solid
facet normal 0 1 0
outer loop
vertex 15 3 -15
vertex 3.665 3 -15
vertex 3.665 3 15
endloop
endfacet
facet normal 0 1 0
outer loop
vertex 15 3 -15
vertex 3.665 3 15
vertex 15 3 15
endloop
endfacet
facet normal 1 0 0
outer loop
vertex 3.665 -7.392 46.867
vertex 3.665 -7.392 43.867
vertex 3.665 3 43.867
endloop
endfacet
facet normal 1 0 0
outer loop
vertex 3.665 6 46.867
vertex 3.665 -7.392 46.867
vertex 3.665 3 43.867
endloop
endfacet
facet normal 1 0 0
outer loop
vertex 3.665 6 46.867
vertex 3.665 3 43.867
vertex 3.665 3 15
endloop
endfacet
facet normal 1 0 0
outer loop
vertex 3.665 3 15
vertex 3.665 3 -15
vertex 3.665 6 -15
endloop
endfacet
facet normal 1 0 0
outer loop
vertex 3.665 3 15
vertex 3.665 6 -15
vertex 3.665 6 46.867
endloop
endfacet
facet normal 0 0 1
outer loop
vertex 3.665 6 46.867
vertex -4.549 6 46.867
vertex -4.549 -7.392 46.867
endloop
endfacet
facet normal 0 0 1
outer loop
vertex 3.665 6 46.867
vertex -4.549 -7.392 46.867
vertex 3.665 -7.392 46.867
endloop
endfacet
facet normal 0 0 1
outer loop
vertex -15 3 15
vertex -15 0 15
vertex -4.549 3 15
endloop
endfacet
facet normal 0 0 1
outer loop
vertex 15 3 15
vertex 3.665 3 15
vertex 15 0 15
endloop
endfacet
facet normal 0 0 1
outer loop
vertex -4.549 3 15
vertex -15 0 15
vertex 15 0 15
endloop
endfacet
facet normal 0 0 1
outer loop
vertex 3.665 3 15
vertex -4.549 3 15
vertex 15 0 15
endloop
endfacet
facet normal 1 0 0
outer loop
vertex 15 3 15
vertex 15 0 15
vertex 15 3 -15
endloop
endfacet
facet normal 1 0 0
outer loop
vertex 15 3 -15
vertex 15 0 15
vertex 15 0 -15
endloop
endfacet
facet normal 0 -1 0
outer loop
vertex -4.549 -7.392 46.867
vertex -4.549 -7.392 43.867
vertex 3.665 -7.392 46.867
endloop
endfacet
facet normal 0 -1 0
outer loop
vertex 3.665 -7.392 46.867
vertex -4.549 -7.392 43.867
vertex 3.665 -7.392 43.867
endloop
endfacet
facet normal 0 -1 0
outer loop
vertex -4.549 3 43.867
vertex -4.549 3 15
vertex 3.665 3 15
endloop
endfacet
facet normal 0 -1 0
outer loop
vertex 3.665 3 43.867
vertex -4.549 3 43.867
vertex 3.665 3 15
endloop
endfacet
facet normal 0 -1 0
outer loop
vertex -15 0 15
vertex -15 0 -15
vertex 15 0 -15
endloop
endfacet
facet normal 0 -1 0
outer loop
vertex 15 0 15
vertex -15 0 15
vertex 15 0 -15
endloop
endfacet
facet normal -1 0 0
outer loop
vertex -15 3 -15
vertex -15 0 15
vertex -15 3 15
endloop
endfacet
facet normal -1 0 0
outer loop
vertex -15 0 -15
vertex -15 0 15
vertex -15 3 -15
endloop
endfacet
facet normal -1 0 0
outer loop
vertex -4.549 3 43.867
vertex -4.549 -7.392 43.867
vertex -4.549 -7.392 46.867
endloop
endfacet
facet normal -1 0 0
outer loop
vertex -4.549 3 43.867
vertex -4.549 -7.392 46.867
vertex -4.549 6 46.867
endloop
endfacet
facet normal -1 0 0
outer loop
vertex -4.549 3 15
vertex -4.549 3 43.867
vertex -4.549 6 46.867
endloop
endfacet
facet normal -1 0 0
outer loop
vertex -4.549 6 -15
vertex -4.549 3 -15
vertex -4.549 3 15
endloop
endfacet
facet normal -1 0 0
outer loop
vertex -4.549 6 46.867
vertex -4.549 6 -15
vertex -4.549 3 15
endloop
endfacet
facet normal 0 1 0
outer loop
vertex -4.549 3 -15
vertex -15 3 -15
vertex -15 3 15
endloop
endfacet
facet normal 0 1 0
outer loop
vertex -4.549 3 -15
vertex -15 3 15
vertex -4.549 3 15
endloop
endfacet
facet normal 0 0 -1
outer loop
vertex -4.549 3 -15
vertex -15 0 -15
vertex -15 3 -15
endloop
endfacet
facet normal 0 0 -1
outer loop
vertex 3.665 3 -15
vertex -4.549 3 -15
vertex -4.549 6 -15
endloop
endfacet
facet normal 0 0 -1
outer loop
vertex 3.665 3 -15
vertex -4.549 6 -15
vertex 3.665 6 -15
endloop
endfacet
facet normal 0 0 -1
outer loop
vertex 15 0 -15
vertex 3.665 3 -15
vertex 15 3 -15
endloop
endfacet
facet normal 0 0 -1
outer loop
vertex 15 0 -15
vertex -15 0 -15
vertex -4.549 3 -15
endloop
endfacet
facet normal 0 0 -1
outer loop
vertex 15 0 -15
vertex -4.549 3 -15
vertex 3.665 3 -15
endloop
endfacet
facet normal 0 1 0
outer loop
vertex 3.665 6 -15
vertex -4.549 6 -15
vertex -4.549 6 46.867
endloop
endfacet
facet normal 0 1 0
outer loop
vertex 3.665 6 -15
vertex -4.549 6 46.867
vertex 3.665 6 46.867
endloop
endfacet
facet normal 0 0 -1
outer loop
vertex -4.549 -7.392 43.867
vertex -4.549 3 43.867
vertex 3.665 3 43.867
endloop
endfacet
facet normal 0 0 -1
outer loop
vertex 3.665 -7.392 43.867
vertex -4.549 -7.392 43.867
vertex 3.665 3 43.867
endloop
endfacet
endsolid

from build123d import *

# Parameters (mm, degrees)
CROQUIS1_W              = 30
CROQUIS1_H              = 30
SALIENTE_EXTRUIR1_DEPTH = 3
CROQUIS2_W              = 8.214533593
CROQUIS2_H              = 58.866686573
SALIENTE_EXTRUIR2_DEPTH = 3
CROQUIS3_W              = 8.214533593
CROQUIS3_H              = 13.391786962
SALIENTE_EXTRUIR3_DEPTH = 3


with BuildPart() as part:
    # Croquis1 → Saliente-Extruir1 (new body)
    with BuildSketch(Plane(origin=(0, 0, 0), x_dir=(1, 0, 0), z_dir=(0, 1, 0))):
        Rectangle(CROQUIS1_W, CROQUIS1_H)
    extrude(amount=SALIENTE_EXTRUIR1_DEPTH)

    # Croquis2 → Saliente-Extruir2 (add)
    with BuildSketch(Plane(origin=(0, 3, 0), x_dir=(1, 0, 0), z_dir=(0, 1, 0))):
        with Locations((-0.441980957, -14.433343287)):
            Rectangle(CROQUIS2_W, CROQUIS2_H)
    extrude(amount=SALIENTE_EXTRUIR2_DEPTH)

    # Croquis3 → Saliente-Extruir3 (add)
    with BuildSketch(Plane.XY.offset(43.866686573)):
        with Locations((-0.441980957, -0.695893481)):
            Rectangle(CROQUIS3_W, CROQUIS3_H)
    extrude(amount=SALIENTE_EXTRUIR3_DEPTH)


solid = part.part
